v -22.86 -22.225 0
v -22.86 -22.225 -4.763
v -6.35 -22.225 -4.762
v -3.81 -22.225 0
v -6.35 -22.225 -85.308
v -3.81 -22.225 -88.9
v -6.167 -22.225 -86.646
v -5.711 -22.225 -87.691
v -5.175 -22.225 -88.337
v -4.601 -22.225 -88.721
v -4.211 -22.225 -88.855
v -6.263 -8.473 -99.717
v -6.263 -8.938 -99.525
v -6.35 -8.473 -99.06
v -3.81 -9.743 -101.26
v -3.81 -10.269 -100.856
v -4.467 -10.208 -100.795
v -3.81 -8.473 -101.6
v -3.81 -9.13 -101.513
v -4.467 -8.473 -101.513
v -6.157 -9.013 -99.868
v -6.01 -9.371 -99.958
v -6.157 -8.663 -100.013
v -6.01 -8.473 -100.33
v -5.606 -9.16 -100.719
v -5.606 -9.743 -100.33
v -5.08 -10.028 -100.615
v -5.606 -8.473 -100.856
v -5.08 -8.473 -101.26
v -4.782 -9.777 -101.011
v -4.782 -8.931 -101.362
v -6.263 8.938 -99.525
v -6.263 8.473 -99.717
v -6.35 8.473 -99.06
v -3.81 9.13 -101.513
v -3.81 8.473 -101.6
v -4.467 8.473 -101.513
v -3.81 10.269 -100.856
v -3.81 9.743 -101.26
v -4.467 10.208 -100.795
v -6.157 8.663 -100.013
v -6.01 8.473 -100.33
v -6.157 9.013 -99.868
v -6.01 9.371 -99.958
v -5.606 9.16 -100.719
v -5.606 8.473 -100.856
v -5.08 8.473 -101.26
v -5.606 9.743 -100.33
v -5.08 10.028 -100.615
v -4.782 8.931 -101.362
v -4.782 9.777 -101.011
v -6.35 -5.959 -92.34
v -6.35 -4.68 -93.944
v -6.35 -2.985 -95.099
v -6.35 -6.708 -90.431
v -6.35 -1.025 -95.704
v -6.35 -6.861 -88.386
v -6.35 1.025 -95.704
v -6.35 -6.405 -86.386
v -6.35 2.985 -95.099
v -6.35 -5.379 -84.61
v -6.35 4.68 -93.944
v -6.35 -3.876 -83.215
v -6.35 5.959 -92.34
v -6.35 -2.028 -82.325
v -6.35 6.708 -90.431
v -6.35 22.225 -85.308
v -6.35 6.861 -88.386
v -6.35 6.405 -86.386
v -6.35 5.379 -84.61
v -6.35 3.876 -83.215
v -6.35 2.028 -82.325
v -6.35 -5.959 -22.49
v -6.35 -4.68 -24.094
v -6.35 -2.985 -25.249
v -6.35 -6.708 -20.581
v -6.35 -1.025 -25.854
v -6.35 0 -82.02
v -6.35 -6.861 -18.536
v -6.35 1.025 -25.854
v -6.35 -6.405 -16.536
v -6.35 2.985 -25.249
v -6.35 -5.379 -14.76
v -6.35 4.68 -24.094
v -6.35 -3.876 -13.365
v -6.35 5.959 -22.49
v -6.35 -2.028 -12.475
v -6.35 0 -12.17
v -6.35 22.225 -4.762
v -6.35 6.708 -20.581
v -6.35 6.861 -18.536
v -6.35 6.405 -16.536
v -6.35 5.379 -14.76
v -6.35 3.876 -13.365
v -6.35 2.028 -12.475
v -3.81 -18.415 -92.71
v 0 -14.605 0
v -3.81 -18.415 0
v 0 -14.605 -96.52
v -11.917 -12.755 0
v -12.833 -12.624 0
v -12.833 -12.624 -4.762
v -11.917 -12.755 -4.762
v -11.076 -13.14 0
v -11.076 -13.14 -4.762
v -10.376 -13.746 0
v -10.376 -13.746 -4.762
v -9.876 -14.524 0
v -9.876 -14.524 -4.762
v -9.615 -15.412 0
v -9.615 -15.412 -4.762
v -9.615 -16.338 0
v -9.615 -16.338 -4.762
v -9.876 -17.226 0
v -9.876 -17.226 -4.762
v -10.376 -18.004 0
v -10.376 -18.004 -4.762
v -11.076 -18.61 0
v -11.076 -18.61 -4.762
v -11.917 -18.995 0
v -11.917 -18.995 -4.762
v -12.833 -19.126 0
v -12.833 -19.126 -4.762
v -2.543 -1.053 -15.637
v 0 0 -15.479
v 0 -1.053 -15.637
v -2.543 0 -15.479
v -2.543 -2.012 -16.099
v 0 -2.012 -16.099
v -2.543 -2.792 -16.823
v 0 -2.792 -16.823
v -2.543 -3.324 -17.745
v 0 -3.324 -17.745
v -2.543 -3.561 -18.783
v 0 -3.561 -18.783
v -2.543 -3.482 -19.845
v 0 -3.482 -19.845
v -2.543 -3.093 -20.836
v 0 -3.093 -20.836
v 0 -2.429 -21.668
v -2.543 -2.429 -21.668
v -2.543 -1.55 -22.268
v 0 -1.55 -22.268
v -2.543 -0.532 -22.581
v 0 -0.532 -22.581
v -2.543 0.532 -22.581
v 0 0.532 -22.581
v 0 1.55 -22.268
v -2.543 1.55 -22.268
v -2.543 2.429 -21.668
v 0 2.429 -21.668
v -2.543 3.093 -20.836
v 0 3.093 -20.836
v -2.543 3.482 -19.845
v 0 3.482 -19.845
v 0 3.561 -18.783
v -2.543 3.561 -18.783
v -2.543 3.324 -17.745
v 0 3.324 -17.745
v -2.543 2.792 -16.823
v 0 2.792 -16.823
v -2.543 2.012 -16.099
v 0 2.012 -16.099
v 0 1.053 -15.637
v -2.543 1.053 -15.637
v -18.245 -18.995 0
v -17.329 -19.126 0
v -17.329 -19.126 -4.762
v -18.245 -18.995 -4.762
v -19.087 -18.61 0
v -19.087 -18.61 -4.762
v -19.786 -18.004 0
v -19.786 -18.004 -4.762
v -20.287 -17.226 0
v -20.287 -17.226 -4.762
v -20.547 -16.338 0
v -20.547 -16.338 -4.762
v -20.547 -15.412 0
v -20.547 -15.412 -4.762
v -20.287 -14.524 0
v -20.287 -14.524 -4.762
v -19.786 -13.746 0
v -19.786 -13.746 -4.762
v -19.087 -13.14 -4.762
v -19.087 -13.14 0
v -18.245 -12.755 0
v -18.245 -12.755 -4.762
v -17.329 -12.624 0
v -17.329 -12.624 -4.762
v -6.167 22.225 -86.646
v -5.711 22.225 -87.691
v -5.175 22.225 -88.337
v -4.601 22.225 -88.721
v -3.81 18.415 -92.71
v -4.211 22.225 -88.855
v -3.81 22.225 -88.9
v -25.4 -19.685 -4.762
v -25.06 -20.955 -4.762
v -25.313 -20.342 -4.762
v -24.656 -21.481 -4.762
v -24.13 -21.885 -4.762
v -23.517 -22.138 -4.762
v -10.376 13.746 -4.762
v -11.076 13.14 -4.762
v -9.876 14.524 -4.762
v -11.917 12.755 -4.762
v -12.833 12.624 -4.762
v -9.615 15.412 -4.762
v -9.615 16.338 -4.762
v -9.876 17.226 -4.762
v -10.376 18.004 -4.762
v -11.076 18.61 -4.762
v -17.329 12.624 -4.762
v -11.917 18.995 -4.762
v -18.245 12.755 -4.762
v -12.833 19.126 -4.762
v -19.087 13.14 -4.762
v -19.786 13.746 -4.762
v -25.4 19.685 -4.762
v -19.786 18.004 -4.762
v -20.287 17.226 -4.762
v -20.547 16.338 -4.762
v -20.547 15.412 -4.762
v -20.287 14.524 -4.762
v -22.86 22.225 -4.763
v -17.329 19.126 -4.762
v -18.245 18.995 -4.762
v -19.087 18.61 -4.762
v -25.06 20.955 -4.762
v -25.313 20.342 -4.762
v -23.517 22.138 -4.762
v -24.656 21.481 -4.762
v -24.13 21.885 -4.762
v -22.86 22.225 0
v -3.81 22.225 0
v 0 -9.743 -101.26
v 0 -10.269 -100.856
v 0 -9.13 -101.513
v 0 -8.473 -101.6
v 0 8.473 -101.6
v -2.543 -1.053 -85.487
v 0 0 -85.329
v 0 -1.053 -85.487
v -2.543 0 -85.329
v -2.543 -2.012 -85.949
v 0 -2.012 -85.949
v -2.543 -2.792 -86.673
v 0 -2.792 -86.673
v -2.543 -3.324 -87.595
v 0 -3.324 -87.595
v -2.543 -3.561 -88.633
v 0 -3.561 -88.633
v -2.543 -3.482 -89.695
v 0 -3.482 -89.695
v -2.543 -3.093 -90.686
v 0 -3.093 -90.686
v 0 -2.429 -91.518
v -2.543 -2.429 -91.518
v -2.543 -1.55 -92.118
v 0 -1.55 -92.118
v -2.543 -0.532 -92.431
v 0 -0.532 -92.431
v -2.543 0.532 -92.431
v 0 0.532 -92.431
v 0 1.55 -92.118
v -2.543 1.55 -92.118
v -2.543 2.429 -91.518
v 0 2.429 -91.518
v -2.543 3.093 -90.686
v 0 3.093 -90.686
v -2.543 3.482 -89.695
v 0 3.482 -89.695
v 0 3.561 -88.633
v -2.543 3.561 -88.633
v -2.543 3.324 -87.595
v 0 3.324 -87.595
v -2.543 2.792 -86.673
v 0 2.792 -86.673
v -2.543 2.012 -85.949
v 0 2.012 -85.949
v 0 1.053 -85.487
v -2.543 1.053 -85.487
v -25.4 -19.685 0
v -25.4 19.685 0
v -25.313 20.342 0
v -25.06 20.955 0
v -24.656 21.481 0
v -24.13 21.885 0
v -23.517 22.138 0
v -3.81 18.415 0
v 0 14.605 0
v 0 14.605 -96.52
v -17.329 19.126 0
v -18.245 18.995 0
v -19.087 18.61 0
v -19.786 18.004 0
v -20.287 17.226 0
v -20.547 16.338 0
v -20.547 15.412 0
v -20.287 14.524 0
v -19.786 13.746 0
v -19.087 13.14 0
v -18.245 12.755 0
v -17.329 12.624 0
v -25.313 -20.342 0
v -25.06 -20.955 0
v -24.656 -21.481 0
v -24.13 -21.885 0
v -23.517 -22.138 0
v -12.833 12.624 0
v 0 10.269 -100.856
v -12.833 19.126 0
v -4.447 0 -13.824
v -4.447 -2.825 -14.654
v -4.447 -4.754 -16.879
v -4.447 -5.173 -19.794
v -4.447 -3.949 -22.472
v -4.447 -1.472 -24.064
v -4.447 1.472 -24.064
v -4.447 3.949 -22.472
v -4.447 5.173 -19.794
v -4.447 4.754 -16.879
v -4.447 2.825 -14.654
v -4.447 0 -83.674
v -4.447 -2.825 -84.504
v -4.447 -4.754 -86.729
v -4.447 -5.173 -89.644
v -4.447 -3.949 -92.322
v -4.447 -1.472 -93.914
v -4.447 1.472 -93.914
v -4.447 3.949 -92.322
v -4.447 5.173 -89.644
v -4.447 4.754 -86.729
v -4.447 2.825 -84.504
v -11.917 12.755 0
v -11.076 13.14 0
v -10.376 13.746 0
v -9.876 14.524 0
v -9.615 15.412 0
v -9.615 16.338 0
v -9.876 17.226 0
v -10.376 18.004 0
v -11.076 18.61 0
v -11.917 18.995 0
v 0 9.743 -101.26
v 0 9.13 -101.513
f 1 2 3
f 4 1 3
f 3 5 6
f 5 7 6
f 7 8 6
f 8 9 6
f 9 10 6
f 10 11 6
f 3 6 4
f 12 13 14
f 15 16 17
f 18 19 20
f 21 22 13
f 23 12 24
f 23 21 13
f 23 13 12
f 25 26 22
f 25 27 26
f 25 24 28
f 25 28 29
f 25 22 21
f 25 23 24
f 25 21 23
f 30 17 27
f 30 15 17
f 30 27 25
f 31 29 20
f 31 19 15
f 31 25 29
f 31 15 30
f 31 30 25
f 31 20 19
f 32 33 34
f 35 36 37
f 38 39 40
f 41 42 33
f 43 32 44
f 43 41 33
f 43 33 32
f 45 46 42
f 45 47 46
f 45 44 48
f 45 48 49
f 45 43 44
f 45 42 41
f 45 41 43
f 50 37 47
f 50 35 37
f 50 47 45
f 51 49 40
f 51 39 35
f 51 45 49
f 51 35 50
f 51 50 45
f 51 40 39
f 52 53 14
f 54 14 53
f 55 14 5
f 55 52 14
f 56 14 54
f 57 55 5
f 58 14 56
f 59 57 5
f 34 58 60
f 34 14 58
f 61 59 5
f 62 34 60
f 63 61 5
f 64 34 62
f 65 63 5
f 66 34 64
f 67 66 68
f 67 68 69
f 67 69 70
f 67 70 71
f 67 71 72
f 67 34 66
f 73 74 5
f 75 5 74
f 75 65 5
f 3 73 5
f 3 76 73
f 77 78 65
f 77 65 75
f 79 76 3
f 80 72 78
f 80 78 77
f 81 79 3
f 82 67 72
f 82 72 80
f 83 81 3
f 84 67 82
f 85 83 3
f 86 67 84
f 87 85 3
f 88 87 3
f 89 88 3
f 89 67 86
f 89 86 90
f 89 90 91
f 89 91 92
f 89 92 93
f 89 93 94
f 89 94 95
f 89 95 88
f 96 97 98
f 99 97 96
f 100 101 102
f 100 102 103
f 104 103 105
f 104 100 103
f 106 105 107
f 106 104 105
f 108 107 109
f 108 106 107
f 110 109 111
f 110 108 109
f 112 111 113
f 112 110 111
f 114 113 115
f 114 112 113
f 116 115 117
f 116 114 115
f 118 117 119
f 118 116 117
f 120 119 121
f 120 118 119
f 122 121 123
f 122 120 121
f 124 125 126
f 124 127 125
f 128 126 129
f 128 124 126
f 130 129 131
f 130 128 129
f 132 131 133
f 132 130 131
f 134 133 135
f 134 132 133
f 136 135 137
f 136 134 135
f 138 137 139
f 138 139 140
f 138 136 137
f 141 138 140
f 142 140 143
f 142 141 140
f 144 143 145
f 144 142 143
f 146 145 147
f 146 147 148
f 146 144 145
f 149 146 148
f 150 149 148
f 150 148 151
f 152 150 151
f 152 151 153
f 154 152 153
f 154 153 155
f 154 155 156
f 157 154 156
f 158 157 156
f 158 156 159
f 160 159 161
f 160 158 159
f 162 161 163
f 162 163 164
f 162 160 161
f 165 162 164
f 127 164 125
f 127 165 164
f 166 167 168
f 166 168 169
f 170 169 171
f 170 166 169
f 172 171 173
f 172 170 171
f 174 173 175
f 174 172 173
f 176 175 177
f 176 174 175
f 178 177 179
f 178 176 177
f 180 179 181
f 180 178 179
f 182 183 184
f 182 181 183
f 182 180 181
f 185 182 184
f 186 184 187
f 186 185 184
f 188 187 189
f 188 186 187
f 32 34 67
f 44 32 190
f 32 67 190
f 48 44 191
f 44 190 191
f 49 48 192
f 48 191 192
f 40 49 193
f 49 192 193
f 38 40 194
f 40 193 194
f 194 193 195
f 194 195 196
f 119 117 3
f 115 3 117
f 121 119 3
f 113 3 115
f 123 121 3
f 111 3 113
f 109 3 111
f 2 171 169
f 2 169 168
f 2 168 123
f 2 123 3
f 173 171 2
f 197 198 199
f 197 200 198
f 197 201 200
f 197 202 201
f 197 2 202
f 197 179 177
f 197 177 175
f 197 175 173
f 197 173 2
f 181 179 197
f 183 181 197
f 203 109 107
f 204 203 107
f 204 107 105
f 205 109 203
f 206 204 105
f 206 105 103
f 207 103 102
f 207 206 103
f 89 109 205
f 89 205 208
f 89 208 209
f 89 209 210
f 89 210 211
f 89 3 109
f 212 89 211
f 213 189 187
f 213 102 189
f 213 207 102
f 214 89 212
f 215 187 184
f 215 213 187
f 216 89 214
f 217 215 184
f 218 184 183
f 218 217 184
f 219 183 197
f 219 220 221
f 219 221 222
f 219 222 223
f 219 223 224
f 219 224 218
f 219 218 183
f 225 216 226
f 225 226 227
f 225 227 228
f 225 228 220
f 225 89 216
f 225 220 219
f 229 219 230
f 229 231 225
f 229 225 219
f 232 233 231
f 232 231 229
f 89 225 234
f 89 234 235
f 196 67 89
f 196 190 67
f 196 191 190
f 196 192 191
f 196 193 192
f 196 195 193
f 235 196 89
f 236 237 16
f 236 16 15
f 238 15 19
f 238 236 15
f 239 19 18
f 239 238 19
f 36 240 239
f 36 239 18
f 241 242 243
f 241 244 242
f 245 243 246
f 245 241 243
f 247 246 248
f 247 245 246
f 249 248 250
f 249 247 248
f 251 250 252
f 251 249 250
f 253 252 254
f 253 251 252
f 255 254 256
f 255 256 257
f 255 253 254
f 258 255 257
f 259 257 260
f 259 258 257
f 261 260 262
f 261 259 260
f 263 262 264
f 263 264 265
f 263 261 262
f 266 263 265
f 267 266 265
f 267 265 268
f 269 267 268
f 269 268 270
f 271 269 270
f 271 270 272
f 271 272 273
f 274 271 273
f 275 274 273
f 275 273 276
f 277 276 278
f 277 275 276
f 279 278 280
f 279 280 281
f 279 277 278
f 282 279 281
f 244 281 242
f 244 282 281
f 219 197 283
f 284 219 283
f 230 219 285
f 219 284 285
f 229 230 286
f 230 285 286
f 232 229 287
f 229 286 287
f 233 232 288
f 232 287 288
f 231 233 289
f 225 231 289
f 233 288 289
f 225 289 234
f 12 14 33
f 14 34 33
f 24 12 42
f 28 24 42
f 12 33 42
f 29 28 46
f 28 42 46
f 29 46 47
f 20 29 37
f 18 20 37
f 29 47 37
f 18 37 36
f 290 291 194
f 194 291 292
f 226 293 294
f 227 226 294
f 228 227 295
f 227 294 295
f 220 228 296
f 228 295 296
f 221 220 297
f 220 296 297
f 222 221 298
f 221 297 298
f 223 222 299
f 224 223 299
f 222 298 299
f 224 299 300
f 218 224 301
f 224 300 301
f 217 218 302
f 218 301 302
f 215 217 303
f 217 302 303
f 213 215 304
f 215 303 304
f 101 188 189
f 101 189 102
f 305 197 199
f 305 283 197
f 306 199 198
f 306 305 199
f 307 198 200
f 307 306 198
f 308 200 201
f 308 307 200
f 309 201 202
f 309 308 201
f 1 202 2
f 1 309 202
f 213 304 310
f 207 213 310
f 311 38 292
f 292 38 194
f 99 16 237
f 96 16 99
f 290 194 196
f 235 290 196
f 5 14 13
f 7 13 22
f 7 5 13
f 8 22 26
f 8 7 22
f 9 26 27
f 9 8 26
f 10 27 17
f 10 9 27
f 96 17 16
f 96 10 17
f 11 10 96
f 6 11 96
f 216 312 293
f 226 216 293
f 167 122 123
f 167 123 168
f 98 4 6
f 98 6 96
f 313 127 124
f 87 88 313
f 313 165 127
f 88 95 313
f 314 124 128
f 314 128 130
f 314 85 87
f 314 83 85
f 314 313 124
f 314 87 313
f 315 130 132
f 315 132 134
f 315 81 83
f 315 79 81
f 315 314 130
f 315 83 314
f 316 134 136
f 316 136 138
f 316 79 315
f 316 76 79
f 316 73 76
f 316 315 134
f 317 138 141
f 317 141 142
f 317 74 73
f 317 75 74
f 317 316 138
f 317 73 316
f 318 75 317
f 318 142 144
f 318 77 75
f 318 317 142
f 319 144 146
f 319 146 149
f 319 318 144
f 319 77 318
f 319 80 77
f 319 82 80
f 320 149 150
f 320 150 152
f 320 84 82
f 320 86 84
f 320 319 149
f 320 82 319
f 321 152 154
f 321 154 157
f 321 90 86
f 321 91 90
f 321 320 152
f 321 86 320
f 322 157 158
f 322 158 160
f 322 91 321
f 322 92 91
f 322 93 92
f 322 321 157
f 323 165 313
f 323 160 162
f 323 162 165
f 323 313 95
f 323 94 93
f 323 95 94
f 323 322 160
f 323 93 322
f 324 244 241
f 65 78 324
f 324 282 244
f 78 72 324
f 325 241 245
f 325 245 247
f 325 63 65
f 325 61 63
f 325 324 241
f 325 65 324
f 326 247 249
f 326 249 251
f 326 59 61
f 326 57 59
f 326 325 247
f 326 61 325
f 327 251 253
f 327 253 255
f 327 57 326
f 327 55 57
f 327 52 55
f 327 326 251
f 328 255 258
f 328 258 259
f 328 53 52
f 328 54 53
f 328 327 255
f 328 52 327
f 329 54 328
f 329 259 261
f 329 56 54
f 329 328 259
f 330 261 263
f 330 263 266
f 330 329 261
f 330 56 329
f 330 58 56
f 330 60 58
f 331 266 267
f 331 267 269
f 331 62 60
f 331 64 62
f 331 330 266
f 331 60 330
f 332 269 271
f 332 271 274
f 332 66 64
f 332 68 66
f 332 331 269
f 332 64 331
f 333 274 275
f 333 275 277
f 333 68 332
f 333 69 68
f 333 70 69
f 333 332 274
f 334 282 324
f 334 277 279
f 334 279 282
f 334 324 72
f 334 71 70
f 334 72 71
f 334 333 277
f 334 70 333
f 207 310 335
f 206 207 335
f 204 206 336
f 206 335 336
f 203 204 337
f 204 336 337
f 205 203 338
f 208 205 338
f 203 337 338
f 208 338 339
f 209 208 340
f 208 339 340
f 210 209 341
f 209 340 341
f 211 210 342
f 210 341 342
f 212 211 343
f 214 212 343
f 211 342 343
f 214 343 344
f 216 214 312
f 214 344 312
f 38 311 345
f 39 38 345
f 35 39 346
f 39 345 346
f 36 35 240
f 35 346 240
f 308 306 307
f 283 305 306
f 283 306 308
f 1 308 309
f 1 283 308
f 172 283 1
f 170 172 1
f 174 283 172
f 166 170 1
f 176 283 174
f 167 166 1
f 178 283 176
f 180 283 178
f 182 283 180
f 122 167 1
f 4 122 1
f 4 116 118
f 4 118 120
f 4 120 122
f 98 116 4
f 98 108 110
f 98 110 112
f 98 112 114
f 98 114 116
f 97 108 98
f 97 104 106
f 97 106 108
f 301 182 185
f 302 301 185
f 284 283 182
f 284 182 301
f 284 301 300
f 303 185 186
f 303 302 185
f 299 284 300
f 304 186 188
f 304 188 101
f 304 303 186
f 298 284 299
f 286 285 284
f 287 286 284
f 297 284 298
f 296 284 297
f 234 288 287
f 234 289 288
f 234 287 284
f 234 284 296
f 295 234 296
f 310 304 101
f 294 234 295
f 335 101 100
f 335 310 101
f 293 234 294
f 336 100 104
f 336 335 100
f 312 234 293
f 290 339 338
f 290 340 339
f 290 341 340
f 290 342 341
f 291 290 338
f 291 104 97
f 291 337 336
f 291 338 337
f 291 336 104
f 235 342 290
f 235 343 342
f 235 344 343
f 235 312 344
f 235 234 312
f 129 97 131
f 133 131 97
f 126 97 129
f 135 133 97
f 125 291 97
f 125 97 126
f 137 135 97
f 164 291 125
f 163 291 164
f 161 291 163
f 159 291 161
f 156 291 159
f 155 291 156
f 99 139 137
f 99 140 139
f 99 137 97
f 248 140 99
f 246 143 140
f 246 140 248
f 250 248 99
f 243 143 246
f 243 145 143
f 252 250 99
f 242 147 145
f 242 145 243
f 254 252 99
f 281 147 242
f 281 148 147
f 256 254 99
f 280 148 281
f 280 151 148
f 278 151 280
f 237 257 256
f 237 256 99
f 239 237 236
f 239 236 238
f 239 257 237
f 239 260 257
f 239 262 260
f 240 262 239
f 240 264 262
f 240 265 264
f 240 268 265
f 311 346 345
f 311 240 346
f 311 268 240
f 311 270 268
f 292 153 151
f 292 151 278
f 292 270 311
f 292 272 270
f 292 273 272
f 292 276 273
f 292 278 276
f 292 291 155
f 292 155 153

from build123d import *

# Parameters (mm, degrees)
BOSS_EXTRUDE1_DEPTH                           = 22.225
SKETCH2_W                                     = 3.81
SKETCH2_H                                     = 3.81
CUT_EXTRUDE1_DEPTH                            = 108.059192156
CUT_EXTRUDE2_DEPTH                            = 108.059192156
FILLET1_R                                     = 2.54
CSK_FOR_1_4_FLAT_HEAD_MACHINE_SCREW1_AT_COUNT = 2
CSK_FOR_1_4_FLAT_HEAD_MACHINE_SCREW1_AT_PITCH = 69.85
CUT_EXTRUDE3_DEPTH                            = 106.732743864
FILLET2_R                                     = 2.54
CHAMFER1_SIZE                                 = 3.81


with BuildPart() as part:
    # Sketch1 → Boss-Extrude1 (new, symmetric)
    with BuildSketch(Plane(origin=(0, 0, 0), x_dir=(1, 0, 0), z_dir=(0, 1, 0))):
        Polygon((0, 0), (0, 101.6), (-6.35, 101.6), (-6.35, 4.7625), (-25.4, 4.7625), (-25.4, 0), align=None)
    extrude(amount=BOSS_EXTRUDE1_DEPTH, both=True)

    # Sketch2 → Cut-Extrude1 (cut, through all)
    with BuildSketch(Plane.XY):
        with Locations((-1.905, 20.32)):
            Rectangle(SKETCH2_W, SKETCH2_H)
        with Locations((-1.905, -20.32)):
            Rectangle(SKETCH2_W, SKETCH2_H)
    extrude(amount=-CUT_EXTRUDE1_DEPTH, mode=Mode.SUBTRACT)

    # Sketch3 → Cut-Extrude2 (cut, through all)
    with BuildSketch(Plane.XY):
        with BuildLine():
            Line((-12.83335, -19.1262), (-17.32915, -19.1262))
            ThreePointArc((-17.32915, -19.1262), (-20.58035, -15.875), (-17.32915, -12.6238))
            Line((-17.32915, -12.6238), (-12.83335, -12.6238))
            ThreePointArc((-12.83335, -12.6238), (-9.58215, -15.875), (-12.83335, -19.1262))
        make_face()
        with BuildLine():
            Line((-12.83335, 19.1262), (-17.32915, 19.1262))
            ThreePointArc((-17.32915, 19.1262), (-20.58035, 15.875), (-17.32915, 12.6238))
            Line((-17.32915, 12.6238), (-12.83335, 12.6238))
            ThreePointArc((-12.83335, 12.6238), (-9.58215, 15.875), (-12.83335, 19.1262))
        make_face()
    extrude(amount=-CUT_EXTRUDE2_DEPTH, mode=Mode.SUBTRACT)

    # Fillet1
    fillet1_edges = [part.edges().sort_by_distance(p)[0] for p in [
        (-25.4, 22.225, -2.38125),
        (-25.4, -22.225, -2.38125),
    ]]
    fillet(fillet1_edges, radius=FILLET1_R)

    # Sketch5 → CSK for 1/4 Flat Head Machine Screw1 (revolve, cut)
    with BuildSketch(Plane(origin=(-6.35, 0, -19.05), x_dir=(0, 0, 1), z_dir=(0, 1, 0))):
        Polygon((0, 0), (0, 6.35), (3.57124, 6.35), (3.57124, 3.806858607), (6.8804917, 0), align=None)
    csk_for_1_4_flat_head_machine_screw1 = revolve(axis=Axis((-12.7, 0, -19.05), (1, 0, 0)), mode=Mode.SUBTRACT)

    # CSK for 1/4 Flat Head Machine Screw1 at: CSK for 1/4 Flat Head Machine Screw1 ×2
    with Locations(*[(0, 0, -i * CSK_FOR_1_4_FLAT_HEAD_MACHINE_SCREW1_AT_PITCH) for i in range(1, CSK_FOR_1_4_FLAT_HEAD_MACHINE_SCREW1_AT_COUNT)]):
        add(csk_for_1_4_flat_head_machine_screw1, mode=Mode.SUBTRACT)

    # Sketch6 → Cut-Extrude3 (cut, through all)
    with BuildSketch(Plane.ZY.offset(6.35)):
        Polygon((-88.9, -22.225), (-101.6, -22.225), (-101.6, -9.525), align=None)
        Polygon((-101.6, 22.225), (-101.6, 9.525), (-88.9, 22.225), align=None)
    extrude(amount=-CUT_EXTRUDE3_DEPTH, mode=Mode.SUBTRACT)

    # Fillet2
    fillet2_edges = [part.edges().sort_by_distance(p)[0] for p in [
        (-6.35, -15.875, -95.25),
        (-6.35, 0, -101.6),
        (-6.35, 15.875, -95.25),
        (-3.175, 9.525, -101.6),
        (-3.175, -9.525, -101.6),
    ]]
    fillet(fillet2_edges, radius=FILLET2_R)

    # Chamfer1
    chamfer1_edges = [part.edges().sort_by_distance(p)[0] for p in [
        (0, 18.415, -46.355),
        (0, -18.415, -46.355),
    ]]
    chamfer(chamfer1_edges, length=CHAMFER1_SIZE - 0.0001)  # a hair under: the kernel refuses the full size


solid = part.part
